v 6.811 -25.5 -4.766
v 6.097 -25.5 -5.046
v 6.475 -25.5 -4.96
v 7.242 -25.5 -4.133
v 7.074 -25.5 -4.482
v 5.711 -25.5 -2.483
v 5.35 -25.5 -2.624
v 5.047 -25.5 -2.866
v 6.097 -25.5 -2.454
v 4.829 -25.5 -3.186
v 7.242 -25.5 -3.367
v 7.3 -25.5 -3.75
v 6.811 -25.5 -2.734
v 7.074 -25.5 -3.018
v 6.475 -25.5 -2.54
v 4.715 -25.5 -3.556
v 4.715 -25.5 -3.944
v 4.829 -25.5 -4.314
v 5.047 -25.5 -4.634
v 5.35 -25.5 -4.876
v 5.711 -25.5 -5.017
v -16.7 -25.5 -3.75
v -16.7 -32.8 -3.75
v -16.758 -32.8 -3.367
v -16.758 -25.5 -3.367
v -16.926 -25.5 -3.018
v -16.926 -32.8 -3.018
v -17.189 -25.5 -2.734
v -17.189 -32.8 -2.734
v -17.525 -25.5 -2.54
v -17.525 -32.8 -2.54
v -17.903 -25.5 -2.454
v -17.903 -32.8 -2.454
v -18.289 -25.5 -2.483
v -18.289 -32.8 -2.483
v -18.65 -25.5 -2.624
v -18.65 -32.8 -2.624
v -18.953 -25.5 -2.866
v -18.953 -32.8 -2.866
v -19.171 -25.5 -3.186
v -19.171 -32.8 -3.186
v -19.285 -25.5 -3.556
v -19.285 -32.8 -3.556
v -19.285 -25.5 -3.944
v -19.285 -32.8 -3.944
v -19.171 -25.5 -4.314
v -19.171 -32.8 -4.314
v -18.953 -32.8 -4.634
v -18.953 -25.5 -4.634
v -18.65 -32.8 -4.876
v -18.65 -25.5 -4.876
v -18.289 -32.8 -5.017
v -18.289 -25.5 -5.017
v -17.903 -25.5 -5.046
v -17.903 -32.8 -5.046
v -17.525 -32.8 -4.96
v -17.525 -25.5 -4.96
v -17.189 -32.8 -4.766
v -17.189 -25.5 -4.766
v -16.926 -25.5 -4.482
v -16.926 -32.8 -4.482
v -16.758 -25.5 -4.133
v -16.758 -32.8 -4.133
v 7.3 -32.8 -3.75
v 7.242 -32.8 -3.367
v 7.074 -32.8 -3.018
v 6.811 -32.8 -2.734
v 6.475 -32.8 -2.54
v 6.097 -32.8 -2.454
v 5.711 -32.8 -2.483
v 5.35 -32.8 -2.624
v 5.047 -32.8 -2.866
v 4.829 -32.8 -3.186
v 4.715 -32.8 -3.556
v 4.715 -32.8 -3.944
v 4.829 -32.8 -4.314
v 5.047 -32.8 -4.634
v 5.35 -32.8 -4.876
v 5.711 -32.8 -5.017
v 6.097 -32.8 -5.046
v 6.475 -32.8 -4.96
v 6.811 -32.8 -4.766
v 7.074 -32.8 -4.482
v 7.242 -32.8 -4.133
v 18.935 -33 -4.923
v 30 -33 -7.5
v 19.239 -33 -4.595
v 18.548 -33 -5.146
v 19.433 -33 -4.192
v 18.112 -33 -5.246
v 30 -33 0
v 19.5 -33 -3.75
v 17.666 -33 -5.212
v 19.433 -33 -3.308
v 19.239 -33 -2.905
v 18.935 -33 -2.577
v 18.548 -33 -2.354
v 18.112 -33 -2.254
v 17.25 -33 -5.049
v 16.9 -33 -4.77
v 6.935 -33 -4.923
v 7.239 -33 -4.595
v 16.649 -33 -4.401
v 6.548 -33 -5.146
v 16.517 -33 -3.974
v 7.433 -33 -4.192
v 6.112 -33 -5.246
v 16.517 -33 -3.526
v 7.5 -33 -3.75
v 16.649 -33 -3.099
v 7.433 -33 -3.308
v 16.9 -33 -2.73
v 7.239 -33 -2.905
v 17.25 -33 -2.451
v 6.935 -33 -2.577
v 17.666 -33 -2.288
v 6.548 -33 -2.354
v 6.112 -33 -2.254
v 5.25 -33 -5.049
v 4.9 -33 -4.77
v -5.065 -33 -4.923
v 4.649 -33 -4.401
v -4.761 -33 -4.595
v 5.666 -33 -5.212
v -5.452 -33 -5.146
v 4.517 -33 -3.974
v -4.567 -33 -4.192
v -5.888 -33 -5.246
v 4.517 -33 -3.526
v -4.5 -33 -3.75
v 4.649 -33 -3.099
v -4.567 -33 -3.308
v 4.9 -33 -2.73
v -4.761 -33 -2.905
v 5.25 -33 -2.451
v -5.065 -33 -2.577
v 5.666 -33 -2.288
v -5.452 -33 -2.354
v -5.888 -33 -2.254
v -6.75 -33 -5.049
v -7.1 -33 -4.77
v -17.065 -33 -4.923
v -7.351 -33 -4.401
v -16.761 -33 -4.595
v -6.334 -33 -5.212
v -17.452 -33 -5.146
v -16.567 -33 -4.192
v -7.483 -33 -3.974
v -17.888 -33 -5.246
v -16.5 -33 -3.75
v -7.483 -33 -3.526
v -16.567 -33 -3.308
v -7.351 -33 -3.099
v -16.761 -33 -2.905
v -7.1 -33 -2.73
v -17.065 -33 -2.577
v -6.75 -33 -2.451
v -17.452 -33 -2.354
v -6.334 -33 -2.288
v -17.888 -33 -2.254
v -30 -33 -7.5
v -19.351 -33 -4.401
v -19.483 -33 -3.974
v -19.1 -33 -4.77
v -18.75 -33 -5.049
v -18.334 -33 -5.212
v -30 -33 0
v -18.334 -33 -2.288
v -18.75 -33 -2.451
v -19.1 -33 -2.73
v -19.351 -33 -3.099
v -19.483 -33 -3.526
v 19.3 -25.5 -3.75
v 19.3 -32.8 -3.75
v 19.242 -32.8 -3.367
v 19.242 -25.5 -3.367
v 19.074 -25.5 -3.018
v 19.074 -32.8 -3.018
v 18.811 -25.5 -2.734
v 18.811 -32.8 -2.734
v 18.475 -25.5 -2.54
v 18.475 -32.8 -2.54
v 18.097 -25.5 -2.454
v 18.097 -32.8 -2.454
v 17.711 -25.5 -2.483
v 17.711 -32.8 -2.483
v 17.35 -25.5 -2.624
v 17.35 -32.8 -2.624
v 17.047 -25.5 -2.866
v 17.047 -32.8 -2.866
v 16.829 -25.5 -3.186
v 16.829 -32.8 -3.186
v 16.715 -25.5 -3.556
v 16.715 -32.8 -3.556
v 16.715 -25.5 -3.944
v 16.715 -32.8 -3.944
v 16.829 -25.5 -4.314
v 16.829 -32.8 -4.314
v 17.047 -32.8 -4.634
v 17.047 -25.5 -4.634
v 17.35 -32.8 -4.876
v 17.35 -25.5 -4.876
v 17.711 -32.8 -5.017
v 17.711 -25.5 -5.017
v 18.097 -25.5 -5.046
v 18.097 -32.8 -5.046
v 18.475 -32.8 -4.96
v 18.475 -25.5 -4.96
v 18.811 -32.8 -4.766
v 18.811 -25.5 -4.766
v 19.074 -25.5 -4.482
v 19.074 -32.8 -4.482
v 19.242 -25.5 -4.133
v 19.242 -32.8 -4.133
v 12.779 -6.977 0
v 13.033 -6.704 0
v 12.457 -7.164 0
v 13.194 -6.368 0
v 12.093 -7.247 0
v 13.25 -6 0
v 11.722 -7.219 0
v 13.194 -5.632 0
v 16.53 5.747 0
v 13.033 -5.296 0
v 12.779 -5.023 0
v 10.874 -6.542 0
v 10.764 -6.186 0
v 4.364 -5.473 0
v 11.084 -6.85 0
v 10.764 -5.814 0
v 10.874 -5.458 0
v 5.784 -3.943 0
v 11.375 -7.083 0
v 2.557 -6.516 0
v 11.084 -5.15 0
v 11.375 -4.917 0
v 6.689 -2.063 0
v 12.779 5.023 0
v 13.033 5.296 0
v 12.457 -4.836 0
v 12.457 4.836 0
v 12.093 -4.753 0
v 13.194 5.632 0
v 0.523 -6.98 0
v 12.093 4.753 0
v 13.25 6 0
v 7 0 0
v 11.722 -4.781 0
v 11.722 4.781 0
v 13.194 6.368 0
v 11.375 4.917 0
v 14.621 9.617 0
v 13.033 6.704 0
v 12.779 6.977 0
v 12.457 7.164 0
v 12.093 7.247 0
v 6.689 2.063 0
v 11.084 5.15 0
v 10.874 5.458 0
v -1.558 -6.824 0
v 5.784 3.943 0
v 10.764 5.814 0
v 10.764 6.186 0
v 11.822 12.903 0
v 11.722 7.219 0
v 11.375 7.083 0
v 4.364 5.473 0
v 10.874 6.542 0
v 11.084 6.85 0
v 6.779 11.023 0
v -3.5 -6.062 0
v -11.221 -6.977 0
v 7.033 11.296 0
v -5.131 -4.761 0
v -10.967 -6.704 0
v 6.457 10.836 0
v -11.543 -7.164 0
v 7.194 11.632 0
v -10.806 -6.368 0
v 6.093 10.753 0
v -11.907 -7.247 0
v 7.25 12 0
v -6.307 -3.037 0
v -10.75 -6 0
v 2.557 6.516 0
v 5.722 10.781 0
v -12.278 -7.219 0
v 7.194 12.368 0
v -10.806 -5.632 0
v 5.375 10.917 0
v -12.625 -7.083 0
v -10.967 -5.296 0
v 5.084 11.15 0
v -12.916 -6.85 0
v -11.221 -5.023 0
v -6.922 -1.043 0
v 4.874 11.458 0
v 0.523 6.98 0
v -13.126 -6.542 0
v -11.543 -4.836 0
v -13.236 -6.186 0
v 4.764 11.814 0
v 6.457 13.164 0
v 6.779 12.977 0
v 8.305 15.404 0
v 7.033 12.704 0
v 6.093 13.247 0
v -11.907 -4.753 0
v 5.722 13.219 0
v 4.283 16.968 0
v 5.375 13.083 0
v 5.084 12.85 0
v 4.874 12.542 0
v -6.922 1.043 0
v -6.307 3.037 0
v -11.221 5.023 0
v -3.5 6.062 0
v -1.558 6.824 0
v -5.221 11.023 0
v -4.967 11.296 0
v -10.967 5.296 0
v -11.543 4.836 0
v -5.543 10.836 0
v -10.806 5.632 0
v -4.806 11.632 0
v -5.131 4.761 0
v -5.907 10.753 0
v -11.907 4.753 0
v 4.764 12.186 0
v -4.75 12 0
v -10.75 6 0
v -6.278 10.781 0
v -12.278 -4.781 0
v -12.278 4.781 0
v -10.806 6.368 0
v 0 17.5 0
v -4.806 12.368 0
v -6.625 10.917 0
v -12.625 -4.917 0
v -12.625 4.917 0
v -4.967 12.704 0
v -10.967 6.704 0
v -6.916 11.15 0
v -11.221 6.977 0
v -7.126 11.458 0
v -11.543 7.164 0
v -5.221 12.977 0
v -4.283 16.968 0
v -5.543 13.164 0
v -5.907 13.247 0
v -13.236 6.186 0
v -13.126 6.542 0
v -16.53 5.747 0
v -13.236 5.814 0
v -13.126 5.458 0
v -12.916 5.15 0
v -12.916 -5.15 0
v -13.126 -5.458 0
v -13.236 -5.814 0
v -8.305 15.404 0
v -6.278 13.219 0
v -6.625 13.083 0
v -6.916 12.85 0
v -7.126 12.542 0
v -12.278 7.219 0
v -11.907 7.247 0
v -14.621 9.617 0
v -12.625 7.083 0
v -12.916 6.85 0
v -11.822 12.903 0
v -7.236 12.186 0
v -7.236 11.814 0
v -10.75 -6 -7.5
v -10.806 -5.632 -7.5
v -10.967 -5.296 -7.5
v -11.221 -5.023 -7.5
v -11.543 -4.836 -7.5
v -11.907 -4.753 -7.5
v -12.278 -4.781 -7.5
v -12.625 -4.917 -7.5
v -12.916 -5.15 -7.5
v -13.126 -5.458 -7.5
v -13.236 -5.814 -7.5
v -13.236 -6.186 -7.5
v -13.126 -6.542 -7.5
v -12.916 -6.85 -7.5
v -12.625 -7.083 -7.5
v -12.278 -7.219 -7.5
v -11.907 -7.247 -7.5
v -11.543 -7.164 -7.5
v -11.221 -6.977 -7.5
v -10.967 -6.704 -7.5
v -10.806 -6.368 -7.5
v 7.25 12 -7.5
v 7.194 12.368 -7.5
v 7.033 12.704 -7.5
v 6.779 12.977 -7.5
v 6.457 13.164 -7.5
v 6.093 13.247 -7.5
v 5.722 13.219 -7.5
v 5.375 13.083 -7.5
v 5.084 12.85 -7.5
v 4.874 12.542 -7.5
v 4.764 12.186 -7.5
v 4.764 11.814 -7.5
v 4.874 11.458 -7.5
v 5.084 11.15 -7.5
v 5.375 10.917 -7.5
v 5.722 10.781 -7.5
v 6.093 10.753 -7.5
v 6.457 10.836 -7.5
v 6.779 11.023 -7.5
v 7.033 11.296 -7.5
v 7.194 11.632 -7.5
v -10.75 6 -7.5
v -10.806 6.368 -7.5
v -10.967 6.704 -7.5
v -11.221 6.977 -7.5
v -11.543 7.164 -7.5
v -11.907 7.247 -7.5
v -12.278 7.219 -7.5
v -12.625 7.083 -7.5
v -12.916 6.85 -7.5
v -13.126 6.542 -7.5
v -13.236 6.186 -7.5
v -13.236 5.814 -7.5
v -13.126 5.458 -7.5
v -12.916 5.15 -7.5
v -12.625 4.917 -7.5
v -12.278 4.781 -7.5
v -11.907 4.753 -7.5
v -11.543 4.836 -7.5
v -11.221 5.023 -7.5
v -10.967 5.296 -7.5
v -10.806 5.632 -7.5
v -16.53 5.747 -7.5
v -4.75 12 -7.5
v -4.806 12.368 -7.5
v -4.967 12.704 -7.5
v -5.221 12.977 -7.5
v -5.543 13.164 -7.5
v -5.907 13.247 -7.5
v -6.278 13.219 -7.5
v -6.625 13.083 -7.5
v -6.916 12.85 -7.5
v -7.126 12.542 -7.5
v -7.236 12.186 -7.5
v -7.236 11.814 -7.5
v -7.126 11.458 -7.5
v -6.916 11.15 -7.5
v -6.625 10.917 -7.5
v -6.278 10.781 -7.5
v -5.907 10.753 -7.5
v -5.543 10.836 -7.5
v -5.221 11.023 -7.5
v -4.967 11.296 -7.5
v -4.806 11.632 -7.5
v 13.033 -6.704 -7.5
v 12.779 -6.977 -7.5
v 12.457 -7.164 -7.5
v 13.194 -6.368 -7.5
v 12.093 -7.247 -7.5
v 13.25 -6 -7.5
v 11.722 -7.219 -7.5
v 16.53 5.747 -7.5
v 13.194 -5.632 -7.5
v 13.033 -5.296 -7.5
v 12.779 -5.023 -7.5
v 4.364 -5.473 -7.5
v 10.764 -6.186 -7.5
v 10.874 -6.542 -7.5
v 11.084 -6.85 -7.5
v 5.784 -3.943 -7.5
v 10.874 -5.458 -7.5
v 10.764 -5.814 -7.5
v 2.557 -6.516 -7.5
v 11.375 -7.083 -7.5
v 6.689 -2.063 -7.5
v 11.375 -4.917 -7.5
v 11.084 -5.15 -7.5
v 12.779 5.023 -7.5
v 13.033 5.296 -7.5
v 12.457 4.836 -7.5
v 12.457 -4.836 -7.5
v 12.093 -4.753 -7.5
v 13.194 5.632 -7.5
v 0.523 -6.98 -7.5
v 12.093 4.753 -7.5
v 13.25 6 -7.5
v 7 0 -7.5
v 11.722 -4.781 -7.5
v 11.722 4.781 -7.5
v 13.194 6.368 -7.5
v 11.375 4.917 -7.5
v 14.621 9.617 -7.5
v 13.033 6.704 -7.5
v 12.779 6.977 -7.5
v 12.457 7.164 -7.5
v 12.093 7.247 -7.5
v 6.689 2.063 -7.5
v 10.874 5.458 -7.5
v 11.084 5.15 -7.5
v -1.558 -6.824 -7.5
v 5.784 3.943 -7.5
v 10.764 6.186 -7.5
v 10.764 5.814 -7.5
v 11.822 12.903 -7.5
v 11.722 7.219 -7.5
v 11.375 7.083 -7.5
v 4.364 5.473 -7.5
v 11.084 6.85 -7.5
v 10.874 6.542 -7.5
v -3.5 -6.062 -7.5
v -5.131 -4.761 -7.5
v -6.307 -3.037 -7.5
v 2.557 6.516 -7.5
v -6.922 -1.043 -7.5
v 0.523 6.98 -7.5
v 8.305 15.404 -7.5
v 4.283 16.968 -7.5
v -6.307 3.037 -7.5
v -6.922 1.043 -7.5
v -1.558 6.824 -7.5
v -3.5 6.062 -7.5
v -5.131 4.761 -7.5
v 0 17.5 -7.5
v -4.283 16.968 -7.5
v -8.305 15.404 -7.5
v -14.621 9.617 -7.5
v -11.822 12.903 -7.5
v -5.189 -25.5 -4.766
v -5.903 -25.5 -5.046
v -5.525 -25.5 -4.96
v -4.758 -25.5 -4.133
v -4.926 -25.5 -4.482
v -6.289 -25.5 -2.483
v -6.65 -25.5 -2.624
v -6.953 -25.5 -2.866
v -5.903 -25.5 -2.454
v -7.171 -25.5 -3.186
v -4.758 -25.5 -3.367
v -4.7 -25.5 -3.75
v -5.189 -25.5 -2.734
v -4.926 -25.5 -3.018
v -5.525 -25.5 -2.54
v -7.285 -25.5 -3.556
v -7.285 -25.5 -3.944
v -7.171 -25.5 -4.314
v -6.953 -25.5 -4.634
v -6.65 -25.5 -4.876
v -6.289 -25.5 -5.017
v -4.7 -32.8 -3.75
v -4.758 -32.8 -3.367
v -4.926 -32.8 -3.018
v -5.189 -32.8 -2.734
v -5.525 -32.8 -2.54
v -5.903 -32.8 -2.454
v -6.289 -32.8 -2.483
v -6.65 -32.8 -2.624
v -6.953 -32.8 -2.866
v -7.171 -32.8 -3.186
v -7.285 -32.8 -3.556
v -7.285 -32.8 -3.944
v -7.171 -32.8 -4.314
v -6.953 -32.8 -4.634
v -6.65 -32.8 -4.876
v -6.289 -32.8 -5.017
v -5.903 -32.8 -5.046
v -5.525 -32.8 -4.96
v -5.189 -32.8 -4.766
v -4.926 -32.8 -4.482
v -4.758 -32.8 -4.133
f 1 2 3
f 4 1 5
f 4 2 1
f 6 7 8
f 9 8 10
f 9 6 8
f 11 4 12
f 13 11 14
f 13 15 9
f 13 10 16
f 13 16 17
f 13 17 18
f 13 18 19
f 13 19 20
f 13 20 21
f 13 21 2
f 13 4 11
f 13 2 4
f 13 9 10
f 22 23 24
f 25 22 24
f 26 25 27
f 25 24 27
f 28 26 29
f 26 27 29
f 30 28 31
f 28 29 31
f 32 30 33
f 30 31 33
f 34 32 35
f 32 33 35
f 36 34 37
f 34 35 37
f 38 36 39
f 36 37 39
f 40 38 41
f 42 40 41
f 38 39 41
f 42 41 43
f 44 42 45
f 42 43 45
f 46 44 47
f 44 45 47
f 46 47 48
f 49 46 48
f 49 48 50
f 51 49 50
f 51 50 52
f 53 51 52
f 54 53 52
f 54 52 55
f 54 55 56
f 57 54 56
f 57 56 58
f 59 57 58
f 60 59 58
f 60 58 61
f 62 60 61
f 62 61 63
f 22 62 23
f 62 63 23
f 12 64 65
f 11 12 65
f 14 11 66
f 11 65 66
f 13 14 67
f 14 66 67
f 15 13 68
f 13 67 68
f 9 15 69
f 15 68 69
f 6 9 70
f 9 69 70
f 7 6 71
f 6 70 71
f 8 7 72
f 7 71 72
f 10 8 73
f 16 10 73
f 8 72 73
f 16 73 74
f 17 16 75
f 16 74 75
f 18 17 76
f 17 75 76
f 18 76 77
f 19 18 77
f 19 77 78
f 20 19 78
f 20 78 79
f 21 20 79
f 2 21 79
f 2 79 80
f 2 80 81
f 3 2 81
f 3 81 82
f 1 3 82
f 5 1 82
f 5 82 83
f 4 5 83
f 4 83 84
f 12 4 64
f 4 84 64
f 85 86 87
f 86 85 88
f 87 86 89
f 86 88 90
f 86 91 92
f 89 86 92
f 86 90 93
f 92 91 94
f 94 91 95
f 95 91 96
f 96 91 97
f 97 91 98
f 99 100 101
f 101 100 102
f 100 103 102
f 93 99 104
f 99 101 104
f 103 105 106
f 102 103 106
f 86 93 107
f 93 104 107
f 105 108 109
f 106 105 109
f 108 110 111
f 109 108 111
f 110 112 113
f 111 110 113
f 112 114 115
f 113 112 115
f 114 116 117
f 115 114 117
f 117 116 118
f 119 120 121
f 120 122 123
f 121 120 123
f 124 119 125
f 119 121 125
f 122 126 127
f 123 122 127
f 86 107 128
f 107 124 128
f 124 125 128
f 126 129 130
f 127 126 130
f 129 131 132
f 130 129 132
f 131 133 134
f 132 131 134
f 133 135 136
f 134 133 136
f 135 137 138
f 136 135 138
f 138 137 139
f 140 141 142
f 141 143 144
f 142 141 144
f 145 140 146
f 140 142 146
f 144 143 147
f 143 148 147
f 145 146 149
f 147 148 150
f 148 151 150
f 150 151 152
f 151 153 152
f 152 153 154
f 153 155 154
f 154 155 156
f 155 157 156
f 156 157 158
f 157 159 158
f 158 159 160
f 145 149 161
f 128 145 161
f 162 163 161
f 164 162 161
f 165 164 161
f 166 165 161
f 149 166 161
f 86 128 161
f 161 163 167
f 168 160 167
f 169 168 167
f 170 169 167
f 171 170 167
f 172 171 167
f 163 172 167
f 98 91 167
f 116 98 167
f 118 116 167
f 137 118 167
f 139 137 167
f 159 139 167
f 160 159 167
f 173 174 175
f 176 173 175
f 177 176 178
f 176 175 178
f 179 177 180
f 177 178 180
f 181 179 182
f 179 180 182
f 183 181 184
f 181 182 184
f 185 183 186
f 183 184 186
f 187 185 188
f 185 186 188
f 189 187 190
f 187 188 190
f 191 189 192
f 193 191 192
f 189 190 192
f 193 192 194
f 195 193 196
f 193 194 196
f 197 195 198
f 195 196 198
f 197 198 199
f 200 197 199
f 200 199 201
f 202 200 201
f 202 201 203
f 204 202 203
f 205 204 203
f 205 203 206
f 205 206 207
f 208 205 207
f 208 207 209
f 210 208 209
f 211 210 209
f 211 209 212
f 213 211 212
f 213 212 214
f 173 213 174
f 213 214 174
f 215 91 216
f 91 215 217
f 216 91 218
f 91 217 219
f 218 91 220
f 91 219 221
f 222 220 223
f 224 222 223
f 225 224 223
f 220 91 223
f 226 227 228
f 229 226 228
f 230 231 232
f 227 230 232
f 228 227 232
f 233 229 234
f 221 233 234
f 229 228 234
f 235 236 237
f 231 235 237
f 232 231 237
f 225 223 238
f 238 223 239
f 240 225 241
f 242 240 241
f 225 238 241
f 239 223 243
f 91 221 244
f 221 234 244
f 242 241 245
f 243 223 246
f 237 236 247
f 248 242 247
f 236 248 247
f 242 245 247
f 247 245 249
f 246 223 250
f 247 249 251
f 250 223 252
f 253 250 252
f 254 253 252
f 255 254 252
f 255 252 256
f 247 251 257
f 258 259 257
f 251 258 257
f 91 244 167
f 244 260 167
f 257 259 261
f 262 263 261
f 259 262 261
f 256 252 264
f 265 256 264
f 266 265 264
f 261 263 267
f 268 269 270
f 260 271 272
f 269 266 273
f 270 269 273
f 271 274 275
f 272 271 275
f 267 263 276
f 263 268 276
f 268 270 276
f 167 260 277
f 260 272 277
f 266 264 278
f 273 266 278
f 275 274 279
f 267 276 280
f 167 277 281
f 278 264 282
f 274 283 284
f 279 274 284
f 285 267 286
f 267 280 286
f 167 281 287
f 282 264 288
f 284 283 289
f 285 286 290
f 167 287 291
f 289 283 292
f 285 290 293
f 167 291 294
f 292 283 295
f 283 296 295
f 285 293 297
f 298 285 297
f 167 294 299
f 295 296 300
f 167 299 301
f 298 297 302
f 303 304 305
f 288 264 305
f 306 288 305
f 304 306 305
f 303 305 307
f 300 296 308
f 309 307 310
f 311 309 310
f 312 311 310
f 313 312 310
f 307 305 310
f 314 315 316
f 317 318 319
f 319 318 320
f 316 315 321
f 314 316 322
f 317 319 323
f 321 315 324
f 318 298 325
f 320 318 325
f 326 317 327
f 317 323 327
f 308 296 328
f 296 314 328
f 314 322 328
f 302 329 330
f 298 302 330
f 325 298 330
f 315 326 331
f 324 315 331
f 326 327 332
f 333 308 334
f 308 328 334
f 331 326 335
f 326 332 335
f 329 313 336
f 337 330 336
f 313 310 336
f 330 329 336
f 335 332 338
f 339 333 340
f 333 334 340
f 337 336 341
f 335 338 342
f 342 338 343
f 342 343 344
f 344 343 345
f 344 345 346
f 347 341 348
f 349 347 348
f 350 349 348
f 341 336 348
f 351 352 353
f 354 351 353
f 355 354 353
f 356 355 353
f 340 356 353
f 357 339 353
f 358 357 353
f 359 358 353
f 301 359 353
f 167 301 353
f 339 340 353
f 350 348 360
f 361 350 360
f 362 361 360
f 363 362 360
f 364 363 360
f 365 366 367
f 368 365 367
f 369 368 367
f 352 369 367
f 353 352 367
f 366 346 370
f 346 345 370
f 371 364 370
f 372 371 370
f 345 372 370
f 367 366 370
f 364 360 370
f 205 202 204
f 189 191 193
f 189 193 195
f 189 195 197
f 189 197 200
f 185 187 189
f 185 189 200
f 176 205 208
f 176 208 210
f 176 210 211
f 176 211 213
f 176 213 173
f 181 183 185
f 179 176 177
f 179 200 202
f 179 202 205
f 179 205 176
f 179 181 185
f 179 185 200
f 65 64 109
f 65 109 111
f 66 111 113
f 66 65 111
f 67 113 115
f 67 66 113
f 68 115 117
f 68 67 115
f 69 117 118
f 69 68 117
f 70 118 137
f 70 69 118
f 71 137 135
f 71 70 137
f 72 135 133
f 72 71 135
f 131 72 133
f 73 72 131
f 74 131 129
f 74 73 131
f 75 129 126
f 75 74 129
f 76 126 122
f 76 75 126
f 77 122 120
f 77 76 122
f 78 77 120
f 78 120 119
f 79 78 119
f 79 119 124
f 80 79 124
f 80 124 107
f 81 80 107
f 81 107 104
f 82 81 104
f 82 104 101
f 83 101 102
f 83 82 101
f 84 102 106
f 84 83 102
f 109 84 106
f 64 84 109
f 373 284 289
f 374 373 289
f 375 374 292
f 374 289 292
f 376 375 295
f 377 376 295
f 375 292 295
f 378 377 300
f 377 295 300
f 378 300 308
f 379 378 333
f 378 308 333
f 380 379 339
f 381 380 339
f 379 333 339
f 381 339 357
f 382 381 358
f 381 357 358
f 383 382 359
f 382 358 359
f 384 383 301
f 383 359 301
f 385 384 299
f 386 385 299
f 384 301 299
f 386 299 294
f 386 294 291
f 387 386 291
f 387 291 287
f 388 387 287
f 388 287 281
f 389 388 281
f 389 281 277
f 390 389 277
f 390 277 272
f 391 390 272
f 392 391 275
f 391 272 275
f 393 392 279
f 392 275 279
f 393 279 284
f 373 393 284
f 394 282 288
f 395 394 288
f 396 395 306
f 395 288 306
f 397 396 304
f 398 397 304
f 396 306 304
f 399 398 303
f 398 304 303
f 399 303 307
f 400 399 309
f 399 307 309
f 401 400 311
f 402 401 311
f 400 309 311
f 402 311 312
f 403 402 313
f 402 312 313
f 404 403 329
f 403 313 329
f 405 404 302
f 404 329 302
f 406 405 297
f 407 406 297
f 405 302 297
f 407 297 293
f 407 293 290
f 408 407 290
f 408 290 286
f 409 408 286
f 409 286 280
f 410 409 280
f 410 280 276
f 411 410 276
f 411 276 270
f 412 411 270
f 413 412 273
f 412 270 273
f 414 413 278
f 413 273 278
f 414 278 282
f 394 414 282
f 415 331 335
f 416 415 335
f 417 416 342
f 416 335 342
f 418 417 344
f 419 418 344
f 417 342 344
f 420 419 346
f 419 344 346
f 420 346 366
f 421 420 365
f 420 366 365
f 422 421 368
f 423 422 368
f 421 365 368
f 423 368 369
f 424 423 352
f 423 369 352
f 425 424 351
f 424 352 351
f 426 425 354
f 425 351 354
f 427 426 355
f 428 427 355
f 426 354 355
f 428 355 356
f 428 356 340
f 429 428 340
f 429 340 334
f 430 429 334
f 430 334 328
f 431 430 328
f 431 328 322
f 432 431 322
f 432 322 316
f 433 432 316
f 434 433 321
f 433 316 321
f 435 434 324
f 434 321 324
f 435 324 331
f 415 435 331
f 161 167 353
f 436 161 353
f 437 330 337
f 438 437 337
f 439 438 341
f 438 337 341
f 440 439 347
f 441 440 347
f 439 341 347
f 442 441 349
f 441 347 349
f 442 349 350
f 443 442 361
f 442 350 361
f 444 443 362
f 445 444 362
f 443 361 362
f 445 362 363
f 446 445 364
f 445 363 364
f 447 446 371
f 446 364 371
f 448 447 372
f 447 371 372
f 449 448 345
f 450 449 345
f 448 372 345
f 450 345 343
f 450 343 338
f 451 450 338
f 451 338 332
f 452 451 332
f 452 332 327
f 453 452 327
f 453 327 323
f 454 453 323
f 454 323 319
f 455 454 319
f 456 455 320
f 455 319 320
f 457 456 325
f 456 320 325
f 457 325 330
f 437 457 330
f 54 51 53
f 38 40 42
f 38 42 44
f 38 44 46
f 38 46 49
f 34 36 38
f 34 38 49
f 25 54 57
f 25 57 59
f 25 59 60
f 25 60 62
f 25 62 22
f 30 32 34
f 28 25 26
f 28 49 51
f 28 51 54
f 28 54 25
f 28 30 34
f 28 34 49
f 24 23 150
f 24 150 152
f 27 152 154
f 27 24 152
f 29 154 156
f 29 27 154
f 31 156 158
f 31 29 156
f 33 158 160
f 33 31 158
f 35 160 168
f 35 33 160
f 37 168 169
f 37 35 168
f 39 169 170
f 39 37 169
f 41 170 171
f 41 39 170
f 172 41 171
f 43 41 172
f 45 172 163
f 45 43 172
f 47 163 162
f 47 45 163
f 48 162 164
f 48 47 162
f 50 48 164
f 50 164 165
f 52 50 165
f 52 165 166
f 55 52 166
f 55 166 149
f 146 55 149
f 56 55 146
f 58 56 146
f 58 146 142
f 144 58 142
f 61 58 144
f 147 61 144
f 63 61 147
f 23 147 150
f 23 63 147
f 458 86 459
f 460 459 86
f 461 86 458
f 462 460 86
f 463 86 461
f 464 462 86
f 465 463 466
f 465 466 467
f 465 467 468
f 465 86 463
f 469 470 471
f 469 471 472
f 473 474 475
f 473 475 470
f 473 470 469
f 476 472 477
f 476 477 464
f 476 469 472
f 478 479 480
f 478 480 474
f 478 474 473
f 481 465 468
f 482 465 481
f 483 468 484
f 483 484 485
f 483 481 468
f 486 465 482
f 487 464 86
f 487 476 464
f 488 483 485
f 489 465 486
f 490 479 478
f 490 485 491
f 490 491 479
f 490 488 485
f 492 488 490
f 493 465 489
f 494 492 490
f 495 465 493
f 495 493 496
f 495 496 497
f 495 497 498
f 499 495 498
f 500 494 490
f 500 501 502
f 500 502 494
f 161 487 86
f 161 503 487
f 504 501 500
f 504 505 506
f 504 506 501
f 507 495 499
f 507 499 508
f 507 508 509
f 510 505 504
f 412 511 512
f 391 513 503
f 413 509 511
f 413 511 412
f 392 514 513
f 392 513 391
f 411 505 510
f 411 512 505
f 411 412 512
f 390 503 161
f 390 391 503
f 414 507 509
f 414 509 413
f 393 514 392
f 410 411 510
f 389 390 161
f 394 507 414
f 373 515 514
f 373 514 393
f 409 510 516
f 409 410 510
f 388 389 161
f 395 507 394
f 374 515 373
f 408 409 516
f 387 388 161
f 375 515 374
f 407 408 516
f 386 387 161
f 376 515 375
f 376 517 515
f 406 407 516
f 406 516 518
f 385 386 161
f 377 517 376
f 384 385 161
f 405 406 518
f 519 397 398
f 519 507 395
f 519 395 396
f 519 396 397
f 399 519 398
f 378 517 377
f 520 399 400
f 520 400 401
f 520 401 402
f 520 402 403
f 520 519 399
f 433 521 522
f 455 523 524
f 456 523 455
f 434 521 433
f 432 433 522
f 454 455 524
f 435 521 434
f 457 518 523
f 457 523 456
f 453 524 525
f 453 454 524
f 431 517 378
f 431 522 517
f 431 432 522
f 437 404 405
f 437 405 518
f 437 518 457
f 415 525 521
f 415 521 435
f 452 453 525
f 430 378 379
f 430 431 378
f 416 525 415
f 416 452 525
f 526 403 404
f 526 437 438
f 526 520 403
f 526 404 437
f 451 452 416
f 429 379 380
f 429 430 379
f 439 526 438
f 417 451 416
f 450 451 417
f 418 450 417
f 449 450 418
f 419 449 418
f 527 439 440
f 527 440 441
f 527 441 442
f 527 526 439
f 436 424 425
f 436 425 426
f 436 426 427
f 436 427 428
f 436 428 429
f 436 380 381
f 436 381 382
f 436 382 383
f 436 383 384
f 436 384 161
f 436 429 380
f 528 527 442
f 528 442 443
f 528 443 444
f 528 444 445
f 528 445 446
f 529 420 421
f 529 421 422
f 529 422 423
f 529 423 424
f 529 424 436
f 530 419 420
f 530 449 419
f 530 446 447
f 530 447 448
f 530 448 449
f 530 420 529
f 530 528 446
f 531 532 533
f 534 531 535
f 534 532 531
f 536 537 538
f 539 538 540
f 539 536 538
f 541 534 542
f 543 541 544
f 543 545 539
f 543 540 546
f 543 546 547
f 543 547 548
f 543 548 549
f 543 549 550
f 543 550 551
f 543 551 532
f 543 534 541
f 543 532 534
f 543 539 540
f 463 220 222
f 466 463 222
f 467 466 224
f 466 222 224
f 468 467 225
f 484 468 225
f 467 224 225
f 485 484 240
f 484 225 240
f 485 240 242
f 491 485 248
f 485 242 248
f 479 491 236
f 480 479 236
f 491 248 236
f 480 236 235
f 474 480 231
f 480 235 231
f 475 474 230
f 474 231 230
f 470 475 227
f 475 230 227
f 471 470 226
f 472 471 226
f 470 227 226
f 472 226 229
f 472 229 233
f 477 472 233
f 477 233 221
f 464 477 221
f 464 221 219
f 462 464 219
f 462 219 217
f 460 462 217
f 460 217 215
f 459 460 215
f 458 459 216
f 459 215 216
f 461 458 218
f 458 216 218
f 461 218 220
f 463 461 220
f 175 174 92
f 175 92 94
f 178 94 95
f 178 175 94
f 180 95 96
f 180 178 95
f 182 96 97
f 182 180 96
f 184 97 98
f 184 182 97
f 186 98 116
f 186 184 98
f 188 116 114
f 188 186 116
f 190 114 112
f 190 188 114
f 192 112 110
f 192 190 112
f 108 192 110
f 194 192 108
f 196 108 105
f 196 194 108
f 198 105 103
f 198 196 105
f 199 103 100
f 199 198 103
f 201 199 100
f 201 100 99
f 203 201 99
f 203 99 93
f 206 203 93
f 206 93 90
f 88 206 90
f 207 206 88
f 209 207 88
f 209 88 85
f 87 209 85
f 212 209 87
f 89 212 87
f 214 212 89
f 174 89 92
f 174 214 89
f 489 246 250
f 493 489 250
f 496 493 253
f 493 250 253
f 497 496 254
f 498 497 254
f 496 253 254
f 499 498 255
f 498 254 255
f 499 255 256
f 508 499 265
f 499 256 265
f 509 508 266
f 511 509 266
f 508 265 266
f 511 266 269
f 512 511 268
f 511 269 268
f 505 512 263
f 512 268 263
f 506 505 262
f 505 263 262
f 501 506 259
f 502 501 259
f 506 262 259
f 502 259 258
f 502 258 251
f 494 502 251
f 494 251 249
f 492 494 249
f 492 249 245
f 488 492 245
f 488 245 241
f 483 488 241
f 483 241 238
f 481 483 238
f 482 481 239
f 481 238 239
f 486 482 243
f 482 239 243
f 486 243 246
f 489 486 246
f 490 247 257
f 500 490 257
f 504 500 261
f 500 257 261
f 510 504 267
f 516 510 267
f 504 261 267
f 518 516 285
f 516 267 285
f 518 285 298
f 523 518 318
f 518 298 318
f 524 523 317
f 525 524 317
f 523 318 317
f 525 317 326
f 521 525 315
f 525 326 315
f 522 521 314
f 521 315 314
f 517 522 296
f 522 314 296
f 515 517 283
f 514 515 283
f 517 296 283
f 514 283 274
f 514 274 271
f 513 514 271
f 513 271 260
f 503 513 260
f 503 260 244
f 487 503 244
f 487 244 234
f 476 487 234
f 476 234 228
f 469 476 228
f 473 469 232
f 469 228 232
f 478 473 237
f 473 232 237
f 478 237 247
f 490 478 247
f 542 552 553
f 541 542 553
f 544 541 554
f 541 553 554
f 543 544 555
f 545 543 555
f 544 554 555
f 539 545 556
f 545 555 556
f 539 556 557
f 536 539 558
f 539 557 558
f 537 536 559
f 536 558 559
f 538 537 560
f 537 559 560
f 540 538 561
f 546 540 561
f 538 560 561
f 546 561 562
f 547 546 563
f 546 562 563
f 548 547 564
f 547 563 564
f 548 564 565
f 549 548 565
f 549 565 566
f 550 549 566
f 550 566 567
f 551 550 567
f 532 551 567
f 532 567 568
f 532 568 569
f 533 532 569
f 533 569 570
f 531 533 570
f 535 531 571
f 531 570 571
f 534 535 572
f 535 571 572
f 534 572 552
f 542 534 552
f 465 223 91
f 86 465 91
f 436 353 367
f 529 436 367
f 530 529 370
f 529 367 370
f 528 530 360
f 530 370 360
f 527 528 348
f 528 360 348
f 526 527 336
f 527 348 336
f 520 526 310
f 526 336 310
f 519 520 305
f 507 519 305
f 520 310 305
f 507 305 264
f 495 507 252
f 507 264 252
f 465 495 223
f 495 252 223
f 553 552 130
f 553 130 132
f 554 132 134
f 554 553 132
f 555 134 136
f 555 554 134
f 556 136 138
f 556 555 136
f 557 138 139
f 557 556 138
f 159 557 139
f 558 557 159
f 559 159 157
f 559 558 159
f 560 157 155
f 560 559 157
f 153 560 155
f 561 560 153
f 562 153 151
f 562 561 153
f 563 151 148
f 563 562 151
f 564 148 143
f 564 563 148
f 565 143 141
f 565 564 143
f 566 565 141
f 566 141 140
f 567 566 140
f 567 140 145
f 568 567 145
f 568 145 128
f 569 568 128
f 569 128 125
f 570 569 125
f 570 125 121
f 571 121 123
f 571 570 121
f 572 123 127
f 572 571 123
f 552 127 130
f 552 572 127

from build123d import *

# Parameters (mm, degrees)
SKETCH_1_R          = 1.25
EXTRUDE_1_DEPTH     = 7.5
SKETCH_2_R          = 1.3
CUT_EXTRUDE_1_DEPTH = 7.5
CHAMFER_1_SIZE      = 0.2


with BuildPart() as part:
    # 草圖1 → 填料-伸長1 (new body)
    with BuildSketch(Plane.XY):
        with BuildLine():
            Line((-30, -33), (0, -33))
            Line((0, -33), (30, -33))
            Line((30, -33), (16.529573398, 5.746581877))
            ThreePointArc((16.529573398, 5.746581877), (0, 17.5), (-16.529573398, 5.746581877))
            Line((-16.529573398, 5.746581877), (-30, -33))
        make_face()
        with Locations((-12, -6)):
            Circle(SKETCH_1_R, mode=Mode.SUBTRACT)
        with BuildLine():
            ThreePointArc((0, -7), (-7, 0), (0, 7))
            ThreePointArc((0, 7), (4.949747468, 4.949747468), (7, 0))
            ThreePointArc((7, 0), (4.949747468, -4.949747468), (0, -7))
        make_face(mode=Mode.SUBTRACT)
        with Locations((-12, 6)):
            Circle(SKETCH_1_R, mode=Mode.SUBTRACT)
        with Locations((-6, 12)):
            Circle(SKETCH_1_R, mode=Mode.SUBTRACT)
        with Locations((12, -6)):
            Circle(SKETCH_1_R, mode=Mode.SUBTRACT)
        with Locations((12, 6)):
            Circle(SKETCH_1_R, mode=Mode.SUBTRACT)
        with Locations((6, 12)):
            Circle(SKETCH_1_R, mode=Mode.SUBTRACT)
    extrude(amount=-EXTRUDE_1_DEPTH)

    # 草圖2 → 除料-伸長1 (cut)
    with BuildSketch(Plane(origin=(0, -33, 0), x_dir=(-1, 0, 0), z_dir=(0, -1, 0))):
        with Locations((-18, 3.75)):
            Circle(SKETCH_2_R)
        with Locations((-6, 3.75)):
            Circle(SKETCH_2_R)
        with Locations((6, 3.75)):
            Circle(SKETCH_2_R)
        with Locations((18, 3.75)):
            Circle(SKETCH_2_R)
    extrude(amount=-CUT_EXTRUDE_1_DEPTH, mode=Mode.SUBTRACT)

    # 導角1
    chamfer_1_edges = [part.edges().sort_by_distance(p)[0] for p in [
        (-16.7, -33, -3.75),
        (-4.7, -33, -3.75),
        (7.3, -33, -3.75),
        (19.3, -33, -3.75),
    ]]
    chamfer(chamfer_1_edges, length=CHAMFER_1_SIZE)


solid = part.part
